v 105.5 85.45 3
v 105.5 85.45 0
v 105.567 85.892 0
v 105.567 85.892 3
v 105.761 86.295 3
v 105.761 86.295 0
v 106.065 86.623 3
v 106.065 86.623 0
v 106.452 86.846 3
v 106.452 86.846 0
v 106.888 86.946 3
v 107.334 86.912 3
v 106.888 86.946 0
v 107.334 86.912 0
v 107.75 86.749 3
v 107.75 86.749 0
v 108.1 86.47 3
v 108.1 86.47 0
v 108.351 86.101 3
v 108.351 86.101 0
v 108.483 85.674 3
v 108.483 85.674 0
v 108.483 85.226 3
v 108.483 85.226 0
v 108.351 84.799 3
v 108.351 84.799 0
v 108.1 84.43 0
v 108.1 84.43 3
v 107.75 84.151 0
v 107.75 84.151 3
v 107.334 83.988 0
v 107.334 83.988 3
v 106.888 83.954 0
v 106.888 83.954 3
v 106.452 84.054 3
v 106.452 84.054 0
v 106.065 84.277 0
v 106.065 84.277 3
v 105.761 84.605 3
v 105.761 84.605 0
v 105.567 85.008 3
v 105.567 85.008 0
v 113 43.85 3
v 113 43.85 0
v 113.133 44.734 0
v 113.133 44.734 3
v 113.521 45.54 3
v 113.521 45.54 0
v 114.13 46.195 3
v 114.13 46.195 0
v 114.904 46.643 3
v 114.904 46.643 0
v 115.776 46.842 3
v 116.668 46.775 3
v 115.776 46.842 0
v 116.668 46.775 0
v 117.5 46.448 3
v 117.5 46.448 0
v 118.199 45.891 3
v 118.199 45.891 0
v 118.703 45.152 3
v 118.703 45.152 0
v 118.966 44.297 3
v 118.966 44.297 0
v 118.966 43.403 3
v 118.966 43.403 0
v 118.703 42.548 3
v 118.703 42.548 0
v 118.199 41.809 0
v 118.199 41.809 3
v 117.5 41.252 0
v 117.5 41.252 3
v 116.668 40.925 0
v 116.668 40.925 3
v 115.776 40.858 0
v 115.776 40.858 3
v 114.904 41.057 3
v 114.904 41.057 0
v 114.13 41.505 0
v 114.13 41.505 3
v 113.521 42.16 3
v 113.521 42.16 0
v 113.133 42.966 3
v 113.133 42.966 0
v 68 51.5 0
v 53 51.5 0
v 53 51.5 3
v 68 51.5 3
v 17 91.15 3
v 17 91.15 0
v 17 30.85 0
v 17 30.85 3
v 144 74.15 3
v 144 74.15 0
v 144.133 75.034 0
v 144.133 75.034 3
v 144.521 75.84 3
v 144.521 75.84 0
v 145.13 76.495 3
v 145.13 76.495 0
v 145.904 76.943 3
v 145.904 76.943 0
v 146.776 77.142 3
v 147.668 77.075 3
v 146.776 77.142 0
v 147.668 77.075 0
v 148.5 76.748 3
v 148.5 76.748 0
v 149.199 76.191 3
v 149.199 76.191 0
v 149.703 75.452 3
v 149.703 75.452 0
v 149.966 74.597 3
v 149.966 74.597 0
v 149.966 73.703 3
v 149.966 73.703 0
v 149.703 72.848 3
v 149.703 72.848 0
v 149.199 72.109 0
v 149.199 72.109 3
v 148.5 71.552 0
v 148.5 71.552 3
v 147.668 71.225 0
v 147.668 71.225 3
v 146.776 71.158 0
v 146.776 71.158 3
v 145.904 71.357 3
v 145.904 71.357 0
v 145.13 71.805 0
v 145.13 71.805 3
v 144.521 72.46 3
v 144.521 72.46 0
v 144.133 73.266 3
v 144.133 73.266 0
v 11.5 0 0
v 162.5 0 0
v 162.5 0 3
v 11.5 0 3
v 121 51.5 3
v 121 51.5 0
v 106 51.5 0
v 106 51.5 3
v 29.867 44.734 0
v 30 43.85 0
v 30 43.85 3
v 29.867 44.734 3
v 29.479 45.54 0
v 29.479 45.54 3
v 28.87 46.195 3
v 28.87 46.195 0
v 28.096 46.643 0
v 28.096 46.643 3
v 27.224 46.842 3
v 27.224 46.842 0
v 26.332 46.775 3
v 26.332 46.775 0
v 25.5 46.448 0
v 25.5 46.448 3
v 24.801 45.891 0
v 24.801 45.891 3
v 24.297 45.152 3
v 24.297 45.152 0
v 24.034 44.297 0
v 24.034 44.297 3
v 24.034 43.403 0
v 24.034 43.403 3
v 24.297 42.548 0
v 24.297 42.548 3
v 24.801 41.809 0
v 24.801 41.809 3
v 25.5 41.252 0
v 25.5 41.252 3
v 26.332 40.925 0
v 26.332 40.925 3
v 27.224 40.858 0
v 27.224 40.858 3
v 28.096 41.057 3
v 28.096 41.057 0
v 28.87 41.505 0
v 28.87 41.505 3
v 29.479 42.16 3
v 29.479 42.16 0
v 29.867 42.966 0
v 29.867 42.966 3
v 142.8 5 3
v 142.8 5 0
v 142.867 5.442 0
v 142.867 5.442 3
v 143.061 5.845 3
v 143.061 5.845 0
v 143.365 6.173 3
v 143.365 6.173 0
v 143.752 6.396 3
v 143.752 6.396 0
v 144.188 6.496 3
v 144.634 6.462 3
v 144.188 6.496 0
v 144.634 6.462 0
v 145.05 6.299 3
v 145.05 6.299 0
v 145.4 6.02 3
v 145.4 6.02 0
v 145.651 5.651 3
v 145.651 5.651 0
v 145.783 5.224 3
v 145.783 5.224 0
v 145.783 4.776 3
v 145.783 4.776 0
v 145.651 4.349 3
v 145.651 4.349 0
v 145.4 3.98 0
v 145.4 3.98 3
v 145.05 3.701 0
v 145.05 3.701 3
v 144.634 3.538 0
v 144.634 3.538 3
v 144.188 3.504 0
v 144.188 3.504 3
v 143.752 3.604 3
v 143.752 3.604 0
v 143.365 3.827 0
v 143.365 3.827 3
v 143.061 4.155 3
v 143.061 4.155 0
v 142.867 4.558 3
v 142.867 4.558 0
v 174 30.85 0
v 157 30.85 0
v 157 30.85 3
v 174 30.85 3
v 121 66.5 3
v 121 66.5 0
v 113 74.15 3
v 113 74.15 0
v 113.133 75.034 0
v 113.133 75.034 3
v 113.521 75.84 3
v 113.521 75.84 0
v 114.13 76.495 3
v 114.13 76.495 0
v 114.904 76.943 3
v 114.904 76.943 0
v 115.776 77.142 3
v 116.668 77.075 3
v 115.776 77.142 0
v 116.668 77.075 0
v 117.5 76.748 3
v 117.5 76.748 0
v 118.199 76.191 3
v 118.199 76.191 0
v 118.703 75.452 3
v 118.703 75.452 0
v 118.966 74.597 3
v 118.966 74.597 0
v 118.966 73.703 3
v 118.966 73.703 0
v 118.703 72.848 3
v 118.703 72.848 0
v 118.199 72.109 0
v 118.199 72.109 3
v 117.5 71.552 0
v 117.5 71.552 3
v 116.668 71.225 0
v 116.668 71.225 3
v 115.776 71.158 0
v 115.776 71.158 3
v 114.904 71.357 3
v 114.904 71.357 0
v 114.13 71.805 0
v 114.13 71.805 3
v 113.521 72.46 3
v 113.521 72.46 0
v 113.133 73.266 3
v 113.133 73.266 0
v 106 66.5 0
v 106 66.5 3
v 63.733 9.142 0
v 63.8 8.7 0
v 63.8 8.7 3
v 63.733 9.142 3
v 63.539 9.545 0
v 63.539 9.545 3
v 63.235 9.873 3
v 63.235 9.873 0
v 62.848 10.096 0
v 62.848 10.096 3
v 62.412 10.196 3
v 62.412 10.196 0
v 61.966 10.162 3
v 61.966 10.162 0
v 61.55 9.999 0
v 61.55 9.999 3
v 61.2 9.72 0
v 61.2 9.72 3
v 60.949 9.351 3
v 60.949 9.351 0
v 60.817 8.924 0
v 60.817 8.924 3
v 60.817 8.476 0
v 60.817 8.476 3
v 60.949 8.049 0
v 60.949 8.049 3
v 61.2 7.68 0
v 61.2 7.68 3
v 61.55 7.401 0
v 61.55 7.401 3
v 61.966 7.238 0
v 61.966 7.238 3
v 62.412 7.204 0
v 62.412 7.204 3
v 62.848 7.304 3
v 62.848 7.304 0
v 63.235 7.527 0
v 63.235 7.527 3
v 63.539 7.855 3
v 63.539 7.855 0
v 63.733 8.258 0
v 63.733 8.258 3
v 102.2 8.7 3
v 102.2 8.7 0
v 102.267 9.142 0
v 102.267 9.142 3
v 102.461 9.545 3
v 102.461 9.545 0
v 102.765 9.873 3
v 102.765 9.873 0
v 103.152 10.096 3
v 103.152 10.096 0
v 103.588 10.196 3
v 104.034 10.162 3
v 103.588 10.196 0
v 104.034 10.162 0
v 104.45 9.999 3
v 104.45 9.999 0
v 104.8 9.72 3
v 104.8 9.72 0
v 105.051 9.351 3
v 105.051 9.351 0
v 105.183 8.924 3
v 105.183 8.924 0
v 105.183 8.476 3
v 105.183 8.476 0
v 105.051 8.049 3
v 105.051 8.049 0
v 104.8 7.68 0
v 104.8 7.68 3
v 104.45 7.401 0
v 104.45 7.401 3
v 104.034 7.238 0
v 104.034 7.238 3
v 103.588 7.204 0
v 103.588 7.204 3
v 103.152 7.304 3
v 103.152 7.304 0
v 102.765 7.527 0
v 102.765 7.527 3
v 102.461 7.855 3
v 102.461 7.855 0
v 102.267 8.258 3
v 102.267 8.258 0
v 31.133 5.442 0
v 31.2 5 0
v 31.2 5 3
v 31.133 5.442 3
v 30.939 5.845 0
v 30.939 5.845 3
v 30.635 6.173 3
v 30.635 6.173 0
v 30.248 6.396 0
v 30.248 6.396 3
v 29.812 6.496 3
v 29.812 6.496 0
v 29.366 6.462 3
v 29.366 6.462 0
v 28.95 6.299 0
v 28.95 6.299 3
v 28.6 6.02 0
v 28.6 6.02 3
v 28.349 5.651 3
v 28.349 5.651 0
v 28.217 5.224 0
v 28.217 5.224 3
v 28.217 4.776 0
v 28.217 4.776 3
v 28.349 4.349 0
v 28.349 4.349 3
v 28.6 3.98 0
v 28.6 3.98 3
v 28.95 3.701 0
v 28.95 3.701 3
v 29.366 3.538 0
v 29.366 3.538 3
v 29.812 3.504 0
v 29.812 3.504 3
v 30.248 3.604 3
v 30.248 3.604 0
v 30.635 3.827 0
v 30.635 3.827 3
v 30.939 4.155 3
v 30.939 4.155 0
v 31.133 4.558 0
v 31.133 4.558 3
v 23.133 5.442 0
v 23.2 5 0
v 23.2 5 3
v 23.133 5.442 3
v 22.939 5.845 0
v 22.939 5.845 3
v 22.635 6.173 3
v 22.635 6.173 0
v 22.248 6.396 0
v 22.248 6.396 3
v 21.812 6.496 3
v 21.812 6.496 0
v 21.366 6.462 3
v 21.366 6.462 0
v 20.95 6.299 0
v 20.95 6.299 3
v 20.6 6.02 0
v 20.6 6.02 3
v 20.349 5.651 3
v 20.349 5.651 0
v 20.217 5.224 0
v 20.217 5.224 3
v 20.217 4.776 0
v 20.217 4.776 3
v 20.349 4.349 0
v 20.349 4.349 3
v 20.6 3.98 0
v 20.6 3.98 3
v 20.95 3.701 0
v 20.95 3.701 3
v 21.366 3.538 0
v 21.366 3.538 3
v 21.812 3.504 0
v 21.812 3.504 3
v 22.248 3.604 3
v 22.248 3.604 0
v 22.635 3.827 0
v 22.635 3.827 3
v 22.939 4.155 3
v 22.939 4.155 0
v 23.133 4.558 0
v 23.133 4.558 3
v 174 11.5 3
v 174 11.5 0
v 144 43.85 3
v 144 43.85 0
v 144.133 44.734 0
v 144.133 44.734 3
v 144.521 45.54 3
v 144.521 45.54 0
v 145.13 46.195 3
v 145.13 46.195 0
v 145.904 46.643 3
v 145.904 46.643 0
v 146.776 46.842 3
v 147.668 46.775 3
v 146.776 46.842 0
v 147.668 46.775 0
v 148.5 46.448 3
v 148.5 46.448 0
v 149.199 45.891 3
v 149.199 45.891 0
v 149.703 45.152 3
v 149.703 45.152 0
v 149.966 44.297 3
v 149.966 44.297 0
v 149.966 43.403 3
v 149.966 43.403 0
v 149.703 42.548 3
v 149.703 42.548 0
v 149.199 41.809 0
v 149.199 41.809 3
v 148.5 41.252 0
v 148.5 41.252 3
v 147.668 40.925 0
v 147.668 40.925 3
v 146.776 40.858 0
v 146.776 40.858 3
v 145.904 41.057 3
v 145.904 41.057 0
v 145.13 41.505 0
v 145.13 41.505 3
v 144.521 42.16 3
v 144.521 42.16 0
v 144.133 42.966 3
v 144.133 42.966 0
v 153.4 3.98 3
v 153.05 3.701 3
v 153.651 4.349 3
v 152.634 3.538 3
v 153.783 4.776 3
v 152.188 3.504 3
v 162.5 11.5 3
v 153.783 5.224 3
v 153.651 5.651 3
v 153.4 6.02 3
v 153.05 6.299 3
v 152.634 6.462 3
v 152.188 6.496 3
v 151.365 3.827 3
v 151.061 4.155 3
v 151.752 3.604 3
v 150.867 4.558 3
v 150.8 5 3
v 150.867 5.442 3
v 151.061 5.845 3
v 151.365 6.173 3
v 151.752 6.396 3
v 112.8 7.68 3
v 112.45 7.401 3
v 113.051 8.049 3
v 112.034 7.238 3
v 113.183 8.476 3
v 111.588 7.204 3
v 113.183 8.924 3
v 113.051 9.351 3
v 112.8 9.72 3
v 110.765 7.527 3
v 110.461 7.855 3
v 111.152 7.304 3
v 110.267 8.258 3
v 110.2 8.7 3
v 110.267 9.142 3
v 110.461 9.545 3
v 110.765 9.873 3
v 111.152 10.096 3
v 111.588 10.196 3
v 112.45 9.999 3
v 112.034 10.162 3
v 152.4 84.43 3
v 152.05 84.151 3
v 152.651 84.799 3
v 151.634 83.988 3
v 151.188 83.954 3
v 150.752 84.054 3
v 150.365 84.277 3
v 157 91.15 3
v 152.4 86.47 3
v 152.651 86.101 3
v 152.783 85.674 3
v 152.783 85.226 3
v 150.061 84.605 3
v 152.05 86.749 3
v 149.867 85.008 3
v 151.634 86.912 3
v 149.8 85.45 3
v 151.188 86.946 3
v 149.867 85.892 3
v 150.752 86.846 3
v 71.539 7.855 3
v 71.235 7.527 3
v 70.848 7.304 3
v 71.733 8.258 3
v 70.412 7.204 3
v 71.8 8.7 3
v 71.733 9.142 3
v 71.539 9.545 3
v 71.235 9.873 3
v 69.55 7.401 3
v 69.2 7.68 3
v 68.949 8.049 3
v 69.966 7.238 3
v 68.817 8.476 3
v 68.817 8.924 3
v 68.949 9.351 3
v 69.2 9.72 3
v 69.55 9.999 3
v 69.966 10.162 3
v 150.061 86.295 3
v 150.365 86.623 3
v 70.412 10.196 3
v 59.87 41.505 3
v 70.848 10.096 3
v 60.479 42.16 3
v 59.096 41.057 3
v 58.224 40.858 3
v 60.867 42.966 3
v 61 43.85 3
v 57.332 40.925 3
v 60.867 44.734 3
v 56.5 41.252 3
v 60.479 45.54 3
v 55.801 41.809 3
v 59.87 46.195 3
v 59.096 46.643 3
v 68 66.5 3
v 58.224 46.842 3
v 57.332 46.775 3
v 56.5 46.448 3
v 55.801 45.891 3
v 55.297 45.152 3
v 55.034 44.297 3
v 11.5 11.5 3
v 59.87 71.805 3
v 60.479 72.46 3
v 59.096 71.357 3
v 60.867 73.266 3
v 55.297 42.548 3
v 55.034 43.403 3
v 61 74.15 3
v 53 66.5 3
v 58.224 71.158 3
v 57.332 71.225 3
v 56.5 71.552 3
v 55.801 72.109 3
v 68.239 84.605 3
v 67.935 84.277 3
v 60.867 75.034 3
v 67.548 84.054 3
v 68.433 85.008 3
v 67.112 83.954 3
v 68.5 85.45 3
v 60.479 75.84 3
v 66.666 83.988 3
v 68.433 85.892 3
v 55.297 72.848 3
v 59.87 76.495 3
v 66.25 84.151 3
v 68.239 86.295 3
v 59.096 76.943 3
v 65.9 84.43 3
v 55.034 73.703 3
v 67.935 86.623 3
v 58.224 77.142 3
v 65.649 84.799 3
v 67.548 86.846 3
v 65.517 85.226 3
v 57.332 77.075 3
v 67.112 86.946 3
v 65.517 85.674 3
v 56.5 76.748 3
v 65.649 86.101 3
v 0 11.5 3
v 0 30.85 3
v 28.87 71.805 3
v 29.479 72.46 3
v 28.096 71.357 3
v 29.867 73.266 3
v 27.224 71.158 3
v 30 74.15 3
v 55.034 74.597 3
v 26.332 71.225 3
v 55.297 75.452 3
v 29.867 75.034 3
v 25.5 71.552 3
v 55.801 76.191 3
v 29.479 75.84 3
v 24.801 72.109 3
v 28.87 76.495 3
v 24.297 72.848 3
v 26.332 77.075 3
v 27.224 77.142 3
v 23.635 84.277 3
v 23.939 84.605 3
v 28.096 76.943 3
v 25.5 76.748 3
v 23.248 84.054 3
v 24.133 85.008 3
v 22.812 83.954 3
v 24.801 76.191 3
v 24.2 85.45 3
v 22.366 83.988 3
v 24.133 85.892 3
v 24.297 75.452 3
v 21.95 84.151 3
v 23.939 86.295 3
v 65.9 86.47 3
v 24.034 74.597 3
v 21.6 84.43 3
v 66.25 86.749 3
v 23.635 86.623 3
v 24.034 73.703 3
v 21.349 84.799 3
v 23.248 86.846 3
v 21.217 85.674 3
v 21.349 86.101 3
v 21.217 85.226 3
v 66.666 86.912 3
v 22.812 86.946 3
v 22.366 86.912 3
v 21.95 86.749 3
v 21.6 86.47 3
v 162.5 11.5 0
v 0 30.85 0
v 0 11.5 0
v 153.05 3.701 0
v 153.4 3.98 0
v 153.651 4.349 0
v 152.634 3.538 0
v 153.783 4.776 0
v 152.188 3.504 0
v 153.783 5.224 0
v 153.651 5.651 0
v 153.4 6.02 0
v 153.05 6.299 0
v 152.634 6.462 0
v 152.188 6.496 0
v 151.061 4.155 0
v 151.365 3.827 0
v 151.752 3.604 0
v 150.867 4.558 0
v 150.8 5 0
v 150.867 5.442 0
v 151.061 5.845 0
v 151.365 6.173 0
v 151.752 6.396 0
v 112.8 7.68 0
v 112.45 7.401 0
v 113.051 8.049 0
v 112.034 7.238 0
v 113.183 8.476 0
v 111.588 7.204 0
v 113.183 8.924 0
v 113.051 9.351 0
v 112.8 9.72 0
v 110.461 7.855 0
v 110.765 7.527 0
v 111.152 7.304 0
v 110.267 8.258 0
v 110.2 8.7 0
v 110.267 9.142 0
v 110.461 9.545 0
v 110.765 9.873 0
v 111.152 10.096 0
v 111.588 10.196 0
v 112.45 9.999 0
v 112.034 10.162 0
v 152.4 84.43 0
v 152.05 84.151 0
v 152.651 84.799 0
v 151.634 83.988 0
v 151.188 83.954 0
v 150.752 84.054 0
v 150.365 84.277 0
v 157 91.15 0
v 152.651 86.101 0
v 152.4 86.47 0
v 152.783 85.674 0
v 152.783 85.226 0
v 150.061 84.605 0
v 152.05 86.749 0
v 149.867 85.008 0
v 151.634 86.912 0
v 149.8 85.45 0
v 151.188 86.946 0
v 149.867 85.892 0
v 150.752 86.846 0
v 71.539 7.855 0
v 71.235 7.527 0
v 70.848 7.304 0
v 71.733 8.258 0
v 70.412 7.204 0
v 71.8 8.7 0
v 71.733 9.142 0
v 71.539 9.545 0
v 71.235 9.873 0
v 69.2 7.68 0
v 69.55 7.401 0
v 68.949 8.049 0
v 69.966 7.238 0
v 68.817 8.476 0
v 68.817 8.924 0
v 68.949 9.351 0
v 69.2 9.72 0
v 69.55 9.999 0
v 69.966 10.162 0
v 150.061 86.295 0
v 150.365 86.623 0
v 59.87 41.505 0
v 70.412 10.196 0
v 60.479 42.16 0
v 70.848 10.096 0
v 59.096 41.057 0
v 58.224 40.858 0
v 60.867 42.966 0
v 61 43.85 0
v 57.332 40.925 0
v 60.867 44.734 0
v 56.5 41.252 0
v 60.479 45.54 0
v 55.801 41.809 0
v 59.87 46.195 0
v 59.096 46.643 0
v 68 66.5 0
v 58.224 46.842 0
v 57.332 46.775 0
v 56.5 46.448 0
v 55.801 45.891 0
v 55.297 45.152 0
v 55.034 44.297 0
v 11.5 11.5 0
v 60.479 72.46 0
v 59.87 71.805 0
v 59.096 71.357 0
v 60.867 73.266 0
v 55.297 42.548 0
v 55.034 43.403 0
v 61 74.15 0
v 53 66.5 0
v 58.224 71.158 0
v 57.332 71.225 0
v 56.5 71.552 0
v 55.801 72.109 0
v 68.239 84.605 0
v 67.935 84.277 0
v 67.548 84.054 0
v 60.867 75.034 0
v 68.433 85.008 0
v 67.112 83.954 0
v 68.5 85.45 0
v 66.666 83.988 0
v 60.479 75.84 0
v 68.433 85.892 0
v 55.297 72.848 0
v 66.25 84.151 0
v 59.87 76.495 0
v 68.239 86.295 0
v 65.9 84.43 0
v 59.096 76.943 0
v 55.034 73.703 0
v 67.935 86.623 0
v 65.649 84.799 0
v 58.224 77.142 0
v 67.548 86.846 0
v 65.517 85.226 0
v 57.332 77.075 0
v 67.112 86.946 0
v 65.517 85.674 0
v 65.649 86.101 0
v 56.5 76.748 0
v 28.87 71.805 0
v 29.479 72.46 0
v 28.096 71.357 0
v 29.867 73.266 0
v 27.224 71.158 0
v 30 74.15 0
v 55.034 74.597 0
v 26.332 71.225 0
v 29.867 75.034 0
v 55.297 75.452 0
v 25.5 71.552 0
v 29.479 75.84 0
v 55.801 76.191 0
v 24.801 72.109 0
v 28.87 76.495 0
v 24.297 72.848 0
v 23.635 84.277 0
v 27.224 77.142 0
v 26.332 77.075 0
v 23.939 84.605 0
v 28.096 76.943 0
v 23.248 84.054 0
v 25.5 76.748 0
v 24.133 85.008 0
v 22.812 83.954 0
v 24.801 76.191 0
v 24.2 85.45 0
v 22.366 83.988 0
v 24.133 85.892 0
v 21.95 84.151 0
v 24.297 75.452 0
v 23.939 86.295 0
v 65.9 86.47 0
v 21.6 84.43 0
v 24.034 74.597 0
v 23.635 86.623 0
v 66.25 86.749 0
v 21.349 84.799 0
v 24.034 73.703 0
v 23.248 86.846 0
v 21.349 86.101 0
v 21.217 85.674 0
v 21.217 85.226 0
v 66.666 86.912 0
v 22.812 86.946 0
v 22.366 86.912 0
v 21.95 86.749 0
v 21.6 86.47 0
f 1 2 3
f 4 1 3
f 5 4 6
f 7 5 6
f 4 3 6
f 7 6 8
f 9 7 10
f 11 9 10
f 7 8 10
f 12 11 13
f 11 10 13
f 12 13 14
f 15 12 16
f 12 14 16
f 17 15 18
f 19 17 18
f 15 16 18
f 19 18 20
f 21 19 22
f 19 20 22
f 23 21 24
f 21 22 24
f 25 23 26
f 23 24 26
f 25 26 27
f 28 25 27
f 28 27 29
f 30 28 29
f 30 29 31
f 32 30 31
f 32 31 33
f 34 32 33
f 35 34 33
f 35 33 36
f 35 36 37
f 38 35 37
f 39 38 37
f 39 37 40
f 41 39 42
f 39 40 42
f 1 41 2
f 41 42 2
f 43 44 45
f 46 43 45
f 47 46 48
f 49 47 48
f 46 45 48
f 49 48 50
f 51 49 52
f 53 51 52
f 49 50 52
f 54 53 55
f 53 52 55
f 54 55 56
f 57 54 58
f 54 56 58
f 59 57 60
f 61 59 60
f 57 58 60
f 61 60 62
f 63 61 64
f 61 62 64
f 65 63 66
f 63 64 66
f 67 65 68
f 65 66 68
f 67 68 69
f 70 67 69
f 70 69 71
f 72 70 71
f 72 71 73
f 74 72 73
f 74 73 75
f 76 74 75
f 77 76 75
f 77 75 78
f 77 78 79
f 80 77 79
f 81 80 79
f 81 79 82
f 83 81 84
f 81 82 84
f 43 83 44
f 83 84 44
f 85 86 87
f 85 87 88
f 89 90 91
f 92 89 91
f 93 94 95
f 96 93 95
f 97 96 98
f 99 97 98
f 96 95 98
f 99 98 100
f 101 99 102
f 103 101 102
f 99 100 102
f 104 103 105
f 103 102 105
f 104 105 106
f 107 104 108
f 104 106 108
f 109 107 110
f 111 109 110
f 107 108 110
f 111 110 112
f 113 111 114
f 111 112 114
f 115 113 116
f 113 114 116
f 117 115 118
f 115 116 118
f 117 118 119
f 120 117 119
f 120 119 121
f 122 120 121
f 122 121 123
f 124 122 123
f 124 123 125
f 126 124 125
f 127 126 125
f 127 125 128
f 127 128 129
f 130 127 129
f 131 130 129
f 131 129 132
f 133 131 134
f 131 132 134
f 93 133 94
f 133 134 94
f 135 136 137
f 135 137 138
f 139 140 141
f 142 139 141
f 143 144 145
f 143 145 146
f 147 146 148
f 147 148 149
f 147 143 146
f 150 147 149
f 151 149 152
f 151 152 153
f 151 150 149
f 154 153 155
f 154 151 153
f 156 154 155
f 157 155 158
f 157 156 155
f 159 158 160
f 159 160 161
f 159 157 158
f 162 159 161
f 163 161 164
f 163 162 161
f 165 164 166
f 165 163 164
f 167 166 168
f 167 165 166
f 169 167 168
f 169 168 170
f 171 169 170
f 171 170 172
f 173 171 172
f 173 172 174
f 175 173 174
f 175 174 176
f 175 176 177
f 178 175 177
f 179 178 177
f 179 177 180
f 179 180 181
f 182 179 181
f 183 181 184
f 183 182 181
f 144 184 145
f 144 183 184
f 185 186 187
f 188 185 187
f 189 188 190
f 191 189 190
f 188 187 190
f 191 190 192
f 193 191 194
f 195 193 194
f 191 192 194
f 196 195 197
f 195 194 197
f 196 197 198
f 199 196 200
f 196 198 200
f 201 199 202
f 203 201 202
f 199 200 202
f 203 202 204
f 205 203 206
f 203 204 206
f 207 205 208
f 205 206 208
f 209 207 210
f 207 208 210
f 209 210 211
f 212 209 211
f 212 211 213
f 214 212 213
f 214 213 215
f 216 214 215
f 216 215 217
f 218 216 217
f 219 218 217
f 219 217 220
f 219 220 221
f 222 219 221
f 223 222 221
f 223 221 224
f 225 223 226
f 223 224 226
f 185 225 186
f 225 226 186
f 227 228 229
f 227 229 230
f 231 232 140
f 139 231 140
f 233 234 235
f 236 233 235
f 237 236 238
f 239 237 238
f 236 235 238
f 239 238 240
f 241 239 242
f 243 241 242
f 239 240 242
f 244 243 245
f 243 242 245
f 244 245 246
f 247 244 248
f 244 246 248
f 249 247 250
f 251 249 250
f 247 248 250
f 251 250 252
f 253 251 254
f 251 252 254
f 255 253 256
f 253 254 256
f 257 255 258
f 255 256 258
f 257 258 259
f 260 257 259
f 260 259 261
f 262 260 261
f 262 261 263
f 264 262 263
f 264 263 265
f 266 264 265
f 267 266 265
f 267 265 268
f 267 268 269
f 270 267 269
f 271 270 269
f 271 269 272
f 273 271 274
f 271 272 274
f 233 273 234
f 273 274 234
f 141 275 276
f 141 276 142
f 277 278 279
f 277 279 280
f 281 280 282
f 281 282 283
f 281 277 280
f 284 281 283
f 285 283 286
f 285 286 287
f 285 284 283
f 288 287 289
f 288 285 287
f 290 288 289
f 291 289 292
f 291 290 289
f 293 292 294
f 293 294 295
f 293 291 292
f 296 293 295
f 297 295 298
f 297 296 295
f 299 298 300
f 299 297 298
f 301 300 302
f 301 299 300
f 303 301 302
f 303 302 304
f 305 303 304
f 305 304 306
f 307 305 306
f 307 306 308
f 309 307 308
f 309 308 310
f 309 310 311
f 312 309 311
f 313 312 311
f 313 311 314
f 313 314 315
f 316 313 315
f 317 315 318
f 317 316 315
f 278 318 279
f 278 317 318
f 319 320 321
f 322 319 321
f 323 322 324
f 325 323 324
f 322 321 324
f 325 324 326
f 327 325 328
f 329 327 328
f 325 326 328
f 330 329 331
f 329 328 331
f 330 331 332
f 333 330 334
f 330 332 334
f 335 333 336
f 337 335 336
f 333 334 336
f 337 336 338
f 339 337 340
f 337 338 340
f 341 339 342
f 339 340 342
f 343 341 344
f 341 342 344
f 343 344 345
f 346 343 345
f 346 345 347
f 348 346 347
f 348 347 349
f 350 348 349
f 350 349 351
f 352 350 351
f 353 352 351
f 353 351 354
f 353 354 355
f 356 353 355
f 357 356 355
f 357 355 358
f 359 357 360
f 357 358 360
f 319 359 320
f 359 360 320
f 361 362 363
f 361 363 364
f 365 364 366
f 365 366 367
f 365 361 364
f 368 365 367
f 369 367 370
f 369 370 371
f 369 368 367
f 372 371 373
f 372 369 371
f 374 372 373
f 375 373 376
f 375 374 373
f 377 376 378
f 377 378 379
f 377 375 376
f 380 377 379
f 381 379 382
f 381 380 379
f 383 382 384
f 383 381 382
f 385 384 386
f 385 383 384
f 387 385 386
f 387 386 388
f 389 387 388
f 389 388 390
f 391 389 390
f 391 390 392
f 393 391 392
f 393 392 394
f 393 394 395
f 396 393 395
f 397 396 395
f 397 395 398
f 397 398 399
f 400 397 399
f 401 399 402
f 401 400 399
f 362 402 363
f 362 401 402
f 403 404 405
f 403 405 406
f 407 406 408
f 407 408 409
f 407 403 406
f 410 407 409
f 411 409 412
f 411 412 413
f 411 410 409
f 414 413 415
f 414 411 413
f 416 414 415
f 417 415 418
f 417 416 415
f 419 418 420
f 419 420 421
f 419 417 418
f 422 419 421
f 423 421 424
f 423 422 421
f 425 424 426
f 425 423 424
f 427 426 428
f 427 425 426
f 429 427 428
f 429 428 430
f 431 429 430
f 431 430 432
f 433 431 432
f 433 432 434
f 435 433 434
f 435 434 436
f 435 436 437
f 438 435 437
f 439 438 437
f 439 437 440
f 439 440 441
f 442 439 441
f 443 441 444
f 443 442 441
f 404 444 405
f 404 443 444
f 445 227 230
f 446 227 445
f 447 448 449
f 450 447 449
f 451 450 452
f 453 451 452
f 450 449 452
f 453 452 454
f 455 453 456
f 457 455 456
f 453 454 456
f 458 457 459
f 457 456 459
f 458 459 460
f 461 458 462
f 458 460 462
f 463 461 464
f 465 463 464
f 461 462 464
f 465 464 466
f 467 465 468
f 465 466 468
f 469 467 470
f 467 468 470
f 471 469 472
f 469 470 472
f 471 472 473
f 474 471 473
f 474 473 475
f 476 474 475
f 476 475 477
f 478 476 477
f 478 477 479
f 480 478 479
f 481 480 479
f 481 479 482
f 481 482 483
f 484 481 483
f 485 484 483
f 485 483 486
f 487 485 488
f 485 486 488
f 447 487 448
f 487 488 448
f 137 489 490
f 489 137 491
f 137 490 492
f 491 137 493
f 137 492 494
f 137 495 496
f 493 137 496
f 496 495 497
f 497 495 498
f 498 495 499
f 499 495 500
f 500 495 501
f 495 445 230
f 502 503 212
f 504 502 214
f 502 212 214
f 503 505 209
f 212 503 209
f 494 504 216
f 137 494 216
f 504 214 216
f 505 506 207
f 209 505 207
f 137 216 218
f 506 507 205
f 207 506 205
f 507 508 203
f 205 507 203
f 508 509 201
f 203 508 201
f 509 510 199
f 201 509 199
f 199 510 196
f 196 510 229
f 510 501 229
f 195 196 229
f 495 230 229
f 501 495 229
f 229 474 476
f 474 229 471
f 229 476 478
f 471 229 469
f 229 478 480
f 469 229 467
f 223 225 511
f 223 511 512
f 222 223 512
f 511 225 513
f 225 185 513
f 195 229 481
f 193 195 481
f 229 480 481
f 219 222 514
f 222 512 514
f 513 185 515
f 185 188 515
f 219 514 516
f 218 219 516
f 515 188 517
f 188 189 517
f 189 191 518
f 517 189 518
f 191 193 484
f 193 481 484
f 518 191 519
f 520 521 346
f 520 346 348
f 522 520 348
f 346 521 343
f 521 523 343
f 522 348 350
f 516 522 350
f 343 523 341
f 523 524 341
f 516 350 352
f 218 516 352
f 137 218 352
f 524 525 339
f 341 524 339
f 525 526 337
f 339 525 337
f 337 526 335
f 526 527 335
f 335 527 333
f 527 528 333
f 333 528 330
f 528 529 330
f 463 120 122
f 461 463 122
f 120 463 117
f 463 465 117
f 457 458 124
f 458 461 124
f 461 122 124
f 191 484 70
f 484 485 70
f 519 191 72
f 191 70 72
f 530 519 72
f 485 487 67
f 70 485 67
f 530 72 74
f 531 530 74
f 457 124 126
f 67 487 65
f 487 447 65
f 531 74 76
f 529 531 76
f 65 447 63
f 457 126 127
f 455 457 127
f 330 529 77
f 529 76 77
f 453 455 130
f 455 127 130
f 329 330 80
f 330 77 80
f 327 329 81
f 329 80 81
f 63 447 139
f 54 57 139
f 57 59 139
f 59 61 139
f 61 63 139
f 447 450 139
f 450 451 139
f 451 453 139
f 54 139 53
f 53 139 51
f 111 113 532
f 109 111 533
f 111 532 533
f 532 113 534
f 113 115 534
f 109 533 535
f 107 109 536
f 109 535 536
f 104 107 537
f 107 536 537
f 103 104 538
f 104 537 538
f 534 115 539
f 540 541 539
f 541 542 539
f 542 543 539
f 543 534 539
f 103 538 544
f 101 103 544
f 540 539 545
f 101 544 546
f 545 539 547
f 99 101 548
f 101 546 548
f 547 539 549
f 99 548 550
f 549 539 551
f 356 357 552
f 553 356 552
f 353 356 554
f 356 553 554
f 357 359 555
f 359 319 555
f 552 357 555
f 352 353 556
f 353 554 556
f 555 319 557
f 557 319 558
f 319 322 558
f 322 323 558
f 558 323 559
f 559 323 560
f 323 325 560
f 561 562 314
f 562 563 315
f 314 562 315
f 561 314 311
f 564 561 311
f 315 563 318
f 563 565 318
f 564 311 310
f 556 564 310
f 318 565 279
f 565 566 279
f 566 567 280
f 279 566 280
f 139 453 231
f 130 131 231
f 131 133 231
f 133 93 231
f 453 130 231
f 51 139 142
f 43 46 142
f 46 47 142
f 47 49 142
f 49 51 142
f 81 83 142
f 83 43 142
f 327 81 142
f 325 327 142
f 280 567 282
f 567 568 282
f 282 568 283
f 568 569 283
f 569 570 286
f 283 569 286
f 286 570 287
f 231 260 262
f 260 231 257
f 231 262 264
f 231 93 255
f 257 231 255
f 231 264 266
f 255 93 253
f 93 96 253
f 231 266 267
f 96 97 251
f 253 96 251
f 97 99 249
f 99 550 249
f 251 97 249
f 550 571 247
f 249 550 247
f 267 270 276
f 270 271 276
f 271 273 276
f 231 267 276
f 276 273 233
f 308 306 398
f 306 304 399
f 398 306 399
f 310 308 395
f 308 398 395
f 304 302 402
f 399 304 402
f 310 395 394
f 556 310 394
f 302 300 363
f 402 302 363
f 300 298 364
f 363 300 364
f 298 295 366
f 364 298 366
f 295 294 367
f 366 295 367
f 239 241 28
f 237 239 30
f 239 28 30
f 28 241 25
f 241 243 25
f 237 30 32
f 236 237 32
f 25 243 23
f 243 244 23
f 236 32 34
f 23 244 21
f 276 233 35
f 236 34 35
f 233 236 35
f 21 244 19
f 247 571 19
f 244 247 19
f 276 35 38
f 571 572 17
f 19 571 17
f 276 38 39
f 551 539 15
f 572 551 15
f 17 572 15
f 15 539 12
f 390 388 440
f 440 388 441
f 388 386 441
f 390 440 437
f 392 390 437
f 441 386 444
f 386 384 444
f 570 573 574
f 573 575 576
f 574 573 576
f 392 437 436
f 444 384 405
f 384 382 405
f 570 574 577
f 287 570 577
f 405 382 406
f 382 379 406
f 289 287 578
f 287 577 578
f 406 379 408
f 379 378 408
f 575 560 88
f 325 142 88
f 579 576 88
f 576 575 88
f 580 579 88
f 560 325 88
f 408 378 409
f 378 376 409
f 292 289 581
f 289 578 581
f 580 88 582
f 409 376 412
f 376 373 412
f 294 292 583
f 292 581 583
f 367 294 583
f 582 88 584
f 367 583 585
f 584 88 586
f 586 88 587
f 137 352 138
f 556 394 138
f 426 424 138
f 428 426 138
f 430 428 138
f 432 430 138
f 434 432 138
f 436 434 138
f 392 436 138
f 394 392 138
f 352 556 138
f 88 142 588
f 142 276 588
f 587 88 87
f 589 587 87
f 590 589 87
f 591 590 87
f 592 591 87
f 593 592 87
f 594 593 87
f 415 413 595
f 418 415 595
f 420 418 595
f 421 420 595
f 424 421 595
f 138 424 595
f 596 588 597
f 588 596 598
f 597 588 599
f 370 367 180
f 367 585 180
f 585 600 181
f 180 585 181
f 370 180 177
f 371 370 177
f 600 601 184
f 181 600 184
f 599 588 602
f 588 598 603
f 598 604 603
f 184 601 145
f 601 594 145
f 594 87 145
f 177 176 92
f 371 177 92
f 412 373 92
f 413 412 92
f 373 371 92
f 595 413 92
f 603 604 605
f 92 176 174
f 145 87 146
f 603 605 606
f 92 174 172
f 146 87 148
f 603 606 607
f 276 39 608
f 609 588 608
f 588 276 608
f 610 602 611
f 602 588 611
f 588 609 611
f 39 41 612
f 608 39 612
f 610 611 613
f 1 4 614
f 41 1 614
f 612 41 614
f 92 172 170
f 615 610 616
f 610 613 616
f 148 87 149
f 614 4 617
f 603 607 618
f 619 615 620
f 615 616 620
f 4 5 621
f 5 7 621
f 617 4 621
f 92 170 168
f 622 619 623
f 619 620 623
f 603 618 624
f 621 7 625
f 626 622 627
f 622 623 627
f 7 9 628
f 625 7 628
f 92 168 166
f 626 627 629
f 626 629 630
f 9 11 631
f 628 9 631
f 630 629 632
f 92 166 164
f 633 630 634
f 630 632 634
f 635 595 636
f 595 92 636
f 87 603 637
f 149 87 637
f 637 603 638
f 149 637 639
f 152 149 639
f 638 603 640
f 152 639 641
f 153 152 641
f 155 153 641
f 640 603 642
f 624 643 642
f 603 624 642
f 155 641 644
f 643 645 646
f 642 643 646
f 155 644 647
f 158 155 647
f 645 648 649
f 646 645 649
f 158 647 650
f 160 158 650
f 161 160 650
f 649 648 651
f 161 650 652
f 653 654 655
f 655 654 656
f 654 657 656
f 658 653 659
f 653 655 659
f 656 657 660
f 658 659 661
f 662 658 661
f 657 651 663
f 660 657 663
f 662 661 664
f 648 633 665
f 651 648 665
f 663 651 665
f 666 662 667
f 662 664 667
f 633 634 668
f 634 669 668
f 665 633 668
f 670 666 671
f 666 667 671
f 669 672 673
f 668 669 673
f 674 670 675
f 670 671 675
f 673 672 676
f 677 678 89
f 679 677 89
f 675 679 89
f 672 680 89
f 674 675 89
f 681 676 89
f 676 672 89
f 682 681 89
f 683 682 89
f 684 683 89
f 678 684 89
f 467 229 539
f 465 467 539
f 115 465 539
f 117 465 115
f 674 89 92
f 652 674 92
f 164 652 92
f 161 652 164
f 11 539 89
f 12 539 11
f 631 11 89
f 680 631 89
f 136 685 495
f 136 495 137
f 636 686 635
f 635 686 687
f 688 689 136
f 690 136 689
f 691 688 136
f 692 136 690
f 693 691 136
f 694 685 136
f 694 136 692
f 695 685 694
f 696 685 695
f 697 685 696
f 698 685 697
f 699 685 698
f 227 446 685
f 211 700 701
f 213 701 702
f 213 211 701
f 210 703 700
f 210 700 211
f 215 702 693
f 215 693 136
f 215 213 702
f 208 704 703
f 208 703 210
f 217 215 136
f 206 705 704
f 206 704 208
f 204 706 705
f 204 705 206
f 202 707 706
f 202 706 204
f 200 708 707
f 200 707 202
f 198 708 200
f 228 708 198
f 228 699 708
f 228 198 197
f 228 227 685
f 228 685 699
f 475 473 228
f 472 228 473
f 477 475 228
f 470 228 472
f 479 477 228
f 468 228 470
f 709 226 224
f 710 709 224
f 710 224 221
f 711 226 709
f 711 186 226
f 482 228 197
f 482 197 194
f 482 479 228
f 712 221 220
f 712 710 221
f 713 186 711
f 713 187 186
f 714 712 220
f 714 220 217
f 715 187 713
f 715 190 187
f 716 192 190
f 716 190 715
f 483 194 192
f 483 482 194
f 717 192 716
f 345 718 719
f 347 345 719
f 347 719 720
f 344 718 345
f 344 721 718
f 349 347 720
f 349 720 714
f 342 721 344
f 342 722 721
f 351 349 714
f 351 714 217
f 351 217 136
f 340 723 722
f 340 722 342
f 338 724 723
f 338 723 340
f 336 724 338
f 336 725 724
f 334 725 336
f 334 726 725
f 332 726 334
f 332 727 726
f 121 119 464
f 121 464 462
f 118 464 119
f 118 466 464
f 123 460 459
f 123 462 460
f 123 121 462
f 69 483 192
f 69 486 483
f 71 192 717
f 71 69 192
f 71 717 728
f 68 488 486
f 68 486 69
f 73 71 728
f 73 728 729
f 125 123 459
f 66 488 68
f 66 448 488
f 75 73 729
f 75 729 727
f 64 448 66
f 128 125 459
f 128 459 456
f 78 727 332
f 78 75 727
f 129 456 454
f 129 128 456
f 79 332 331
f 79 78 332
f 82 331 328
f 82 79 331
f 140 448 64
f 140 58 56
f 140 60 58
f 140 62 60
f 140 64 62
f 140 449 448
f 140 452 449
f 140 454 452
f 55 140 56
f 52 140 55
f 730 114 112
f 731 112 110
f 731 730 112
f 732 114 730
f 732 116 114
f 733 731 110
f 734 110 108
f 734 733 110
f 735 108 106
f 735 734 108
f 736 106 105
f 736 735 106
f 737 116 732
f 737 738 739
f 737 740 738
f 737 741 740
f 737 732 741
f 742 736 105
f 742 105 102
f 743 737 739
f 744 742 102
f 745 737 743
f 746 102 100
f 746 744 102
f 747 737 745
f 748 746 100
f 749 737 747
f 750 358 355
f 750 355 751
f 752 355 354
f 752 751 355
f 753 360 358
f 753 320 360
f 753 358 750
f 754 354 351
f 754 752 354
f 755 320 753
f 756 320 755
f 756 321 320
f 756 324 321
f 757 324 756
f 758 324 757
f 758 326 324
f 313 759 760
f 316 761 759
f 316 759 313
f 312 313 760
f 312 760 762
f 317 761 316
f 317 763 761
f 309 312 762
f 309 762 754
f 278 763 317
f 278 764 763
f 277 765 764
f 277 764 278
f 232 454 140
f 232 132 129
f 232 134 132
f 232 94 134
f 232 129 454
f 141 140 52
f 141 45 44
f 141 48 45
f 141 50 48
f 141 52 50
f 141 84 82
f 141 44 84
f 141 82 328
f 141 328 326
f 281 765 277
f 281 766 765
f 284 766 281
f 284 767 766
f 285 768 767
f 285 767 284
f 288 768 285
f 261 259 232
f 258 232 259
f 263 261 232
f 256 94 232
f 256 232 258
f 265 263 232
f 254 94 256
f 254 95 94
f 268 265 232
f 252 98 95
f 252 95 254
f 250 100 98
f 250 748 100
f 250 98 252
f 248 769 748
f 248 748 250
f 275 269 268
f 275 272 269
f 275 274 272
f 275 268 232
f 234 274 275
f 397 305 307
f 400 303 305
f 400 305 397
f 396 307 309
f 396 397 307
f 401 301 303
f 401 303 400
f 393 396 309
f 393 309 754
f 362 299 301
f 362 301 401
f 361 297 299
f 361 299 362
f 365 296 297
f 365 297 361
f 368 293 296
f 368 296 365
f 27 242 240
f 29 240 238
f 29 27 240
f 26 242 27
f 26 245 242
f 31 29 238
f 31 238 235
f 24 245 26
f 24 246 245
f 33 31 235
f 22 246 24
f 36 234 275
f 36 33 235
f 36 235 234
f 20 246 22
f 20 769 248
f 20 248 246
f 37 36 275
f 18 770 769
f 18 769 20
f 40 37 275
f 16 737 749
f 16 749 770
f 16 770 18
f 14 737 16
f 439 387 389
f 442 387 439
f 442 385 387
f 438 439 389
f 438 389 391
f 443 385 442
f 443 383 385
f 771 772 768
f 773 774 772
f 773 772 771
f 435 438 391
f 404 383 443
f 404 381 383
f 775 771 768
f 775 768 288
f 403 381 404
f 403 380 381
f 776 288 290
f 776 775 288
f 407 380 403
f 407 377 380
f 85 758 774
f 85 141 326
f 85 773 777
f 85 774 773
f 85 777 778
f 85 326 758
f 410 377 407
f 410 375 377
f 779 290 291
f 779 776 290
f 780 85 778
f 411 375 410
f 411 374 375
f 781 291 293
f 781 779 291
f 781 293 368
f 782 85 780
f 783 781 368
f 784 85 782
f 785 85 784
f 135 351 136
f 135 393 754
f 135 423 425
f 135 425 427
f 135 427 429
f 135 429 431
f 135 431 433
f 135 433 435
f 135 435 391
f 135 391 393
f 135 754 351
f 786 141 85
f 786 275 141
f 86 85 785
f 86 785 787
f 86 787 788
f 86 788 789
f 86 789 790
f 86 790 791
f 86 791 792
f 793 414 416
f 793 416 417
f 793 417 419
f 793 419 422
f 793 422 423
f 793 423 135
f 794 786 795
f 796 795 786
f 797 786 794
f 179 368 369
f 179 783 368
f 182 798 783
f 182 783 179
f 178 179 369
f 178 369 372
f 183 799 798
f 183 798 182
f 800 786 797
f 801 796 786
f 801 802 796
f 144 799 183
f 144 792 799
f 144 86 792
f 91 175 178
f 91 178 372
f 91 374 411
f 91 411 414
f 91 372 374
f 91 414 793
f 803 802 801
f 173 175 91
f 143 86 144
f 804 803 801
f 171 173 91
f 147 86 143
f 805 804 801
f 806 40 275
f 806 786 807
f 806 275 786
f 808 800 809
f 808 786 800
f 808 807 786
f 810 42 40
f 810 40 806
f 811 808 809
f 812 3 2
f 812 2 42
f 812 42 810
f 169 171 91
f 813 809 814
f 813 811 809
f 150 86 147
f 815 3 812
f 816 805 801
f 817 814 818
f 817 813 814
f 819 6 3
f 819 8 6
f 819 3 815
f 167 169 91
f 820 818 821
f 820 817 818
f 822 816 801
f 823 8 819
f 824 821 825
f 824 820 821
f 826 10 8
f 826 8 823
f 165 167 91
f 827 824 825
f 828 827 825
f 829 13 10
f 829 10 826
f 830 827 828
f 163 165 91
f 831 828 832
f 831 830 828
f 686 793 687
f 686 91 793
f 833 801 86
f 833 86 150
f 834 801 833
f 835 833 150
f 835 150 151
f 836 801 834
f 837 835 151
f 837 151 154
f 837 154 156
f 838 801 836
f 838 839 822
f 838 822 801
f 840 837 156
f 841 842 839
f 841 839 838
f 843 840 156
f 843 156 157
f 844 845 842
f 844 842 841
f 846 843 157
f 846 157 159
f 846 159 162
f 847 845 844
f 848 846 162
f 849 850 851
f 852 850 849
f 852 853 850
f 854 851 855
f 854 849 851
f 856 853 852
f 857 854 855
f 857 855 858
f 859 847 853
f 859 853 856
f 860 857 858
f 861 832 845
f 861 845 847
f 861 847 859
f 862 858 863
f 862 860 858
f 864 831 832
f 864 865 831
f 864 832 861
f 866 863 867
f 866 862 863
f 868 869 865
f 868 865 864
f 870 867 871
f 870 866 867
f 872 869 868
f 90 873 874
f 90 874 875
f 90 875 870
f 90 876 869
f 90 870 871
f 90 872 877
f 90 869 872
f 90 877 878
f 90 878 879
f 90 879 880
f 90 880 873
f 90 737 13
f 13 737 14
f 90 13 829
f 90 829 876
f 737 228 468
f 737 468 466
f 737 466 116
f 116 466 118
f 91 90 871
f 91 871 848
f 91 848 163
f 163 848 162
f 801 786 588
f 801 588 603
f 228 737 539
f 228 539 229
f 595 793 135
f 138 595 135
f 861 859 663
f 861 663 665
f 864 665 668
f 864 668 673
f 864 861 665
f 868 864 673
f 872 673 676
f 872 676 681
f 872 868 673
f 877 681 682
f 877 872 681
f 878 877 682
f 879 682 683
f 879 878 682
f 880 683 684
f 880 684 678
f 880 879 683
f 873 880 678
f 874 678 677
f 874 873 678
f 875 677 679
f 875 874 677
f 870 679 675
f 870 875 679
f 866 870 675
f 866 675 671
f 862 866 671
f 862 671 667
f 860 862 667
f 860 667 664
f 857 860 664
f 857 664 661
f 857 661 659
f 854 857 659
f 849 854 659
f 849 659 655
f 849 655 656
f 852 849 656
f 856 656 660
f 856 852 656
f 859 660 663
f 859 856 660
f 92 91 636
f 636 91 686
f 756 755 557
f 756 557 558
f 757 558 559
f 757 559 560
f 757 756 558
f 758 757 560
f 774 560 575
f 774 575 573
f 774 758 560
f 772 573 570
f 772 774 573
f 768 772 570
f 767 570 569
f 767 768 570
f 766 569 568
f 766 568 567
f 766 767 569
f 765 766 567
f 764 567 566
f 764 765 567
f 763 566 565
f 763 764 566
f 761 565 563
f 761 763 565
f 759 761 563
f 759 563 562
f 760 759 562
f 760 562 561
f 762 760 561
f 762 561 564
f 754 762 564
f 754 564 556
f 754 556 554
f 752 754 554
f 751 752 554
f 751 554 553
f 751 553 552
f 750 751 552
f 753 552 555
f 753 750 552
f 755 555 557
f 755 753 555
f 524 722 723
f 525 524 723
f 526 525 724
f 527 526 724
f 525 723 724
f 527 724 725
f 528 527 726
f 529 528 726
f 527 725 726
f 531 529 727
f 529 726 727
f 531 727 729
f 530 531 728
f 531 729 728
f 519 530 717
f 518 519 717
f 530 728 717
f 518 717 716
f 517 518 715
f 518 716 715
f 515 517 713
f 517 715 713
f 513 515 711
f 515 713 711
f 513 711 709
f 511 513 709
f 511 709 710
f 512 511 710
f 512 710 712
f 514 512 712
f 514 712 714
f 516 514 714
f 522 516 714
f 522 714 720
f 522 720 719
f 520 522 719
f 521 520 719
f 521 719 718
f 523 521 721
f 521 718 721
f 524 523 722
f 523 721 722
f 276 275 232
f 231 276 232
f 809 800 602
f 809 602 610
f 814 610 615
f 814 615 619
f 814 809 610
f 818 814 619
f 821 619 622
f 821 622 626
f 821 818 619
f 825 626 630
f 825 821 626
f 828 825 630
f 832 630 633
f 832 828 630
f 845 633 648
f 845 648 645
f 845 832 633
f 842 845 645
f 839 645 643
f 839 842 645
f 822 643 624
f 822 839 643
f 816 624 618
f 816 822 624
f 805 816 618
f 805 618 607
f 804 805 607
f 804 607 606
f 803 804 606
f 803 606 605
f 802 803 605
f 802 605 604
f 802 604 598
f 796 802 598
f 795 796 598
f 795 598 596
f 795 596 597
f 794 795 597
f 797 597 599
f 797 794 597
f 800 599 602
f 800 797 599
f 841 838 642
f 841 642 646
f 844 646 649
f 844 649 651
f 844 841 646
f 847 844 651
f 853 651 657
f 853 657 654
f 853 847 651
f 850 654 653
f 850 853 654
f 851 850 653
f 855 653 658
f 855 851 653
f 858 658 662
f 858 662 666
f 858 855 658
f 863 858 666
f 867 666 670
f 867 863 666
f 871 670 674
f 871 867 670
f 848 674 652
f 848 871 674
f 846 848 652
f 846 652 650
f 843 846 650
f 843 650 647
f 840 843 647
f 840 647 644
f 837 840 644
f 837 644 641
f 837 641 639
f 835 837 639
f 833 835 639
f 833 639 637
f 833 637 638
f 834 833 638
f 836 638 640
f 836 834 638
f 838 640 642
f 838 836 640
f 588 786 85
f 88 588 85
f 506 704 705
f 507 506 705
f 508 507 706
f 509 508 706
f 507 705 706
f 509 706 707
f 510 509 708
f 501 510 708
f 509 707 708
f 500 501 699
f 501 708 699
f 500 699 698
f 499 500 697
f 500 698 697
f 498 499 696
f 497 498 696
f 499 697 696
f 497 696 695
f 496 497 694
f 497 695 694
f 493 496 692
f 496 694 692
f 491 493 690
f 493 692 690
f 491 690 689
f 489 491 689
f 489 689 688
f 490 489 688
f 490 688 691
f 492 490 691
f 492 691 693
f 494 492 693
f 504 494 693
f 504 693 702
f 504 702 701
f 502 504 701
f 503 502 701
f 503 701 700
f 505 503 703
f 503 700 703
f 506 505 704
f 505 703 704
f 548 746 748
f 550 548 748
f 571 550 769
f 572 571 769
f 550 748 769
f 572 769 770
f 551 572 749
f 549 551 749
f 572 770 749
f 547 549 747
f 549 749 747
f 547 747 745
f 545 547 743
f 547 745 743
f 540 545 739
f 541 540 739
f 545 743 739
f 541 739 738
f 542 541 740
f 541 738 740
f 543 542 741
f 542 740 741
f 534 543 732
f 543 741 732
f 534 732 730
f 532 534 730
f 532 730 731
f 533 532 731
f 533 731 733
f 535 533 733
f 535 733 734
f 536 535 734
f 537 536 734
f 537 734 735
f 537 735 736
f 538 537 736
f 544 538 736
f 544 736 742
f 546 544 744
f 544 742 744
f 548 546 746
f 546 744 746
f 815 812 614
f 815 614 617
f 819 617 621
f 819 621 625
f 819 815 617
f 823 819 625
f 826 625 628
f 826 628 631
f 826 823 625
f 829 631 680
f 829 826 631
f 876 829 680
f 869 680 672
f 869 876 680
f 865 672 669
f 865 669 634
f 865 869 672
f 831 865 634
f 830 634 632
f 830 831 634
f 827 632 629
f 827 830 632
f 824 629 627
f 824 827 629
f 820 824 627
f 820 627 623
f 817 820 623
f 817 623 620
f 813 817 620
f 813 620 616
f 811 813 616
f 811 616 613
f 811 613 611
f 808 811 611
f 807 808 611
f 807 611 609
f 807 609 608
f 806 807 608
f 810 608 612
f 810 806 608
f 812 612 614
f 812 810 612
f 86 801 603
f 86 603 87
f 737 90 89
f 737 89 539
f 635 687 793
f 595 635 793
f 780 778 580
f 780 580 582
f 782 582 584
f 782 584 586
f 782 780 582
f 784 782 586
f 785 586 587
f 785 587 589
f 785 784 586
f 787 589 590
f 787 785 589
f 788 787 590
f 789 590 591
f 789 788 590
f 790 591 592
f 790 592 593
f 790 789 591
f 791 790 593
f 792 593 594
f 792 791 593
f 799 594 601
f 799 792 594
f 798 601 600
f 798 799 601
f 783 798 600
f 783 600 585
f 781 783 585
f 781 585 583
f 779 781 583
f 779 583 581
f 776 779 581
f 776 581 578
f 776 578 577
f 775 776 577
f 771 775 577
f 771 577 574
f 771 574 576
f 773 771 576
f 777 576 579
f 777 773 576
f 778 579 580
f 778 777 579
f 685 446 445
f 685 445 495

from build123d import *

# Parameters (mm, degrees)
SKETCH_R   = 3
SKETCH_R_2 = 1.5
PAD_DEPTH  = 3


with BuildPart() as part:
    # Sketch → Pad (new body)
    with BuildSketch(Plane.XY):
        Polygon((87, 0), (87, 91.15), (17, 91.15), (17, 30.85), (0, 30.85), (0, 11.5), (11.5, 11.5), (11.5, 0), align=None)
        with Locations((27, 74.15)):
            Circle(SKETCH_R, mode=Mode.SUBTRACT)
        with Locations((58, 74.15)):
            Circle(SKETCH_R, mode=Mode.SUBTRACT)
        with Locations((58, 43.85)):
            Circle(SKETCH_R, mode=Mode.SUBTRACT)
        with Locations((27, 43.85)):
            Circle(SKETCH_R, mode=Mode.SUBTRACT)
        with Locations((21.7, 5)):
            Circle(SKETCH_R_2, mode=Mode.SUBTRACT)
        with Locations((29.7, 5)):
            Circle(SKETCH_R_2, mode=Mode.SUBTRACT)
        with Locations((70.3, 8.7)):
            Circle(SKETCH_R_2, mode=Mode.SUBTRACT)
        with Locations((62.3, 8.7)):
            Circle(SKETCH_R_2, mode=Mode.SUBTRACT)
        with Locations((22.7, 85.45)):
            Circle(SKETCH_R_2, mode=Mode.SUBTRACT)
        with Locations((67, 85.45)):
            Circle(SKETCH_R_2, mode=Mode.SUBTRACT)
        Polygon((68, 59), (68, 66.5), (53, 66.5), (53, 51.5), (68, 51.5), align=None, mode=Mode.SUBTRACT)
    pad = extrude(amount=PAD_DEPTH)

    # Mirrored: Pad across face of Pad
    add(pad.mirror(Plane(origin=(87, 45.575, 1.5), x_dir=(0, 1, 0), z_dir=(1, 0, 0))))


solid = part.part
